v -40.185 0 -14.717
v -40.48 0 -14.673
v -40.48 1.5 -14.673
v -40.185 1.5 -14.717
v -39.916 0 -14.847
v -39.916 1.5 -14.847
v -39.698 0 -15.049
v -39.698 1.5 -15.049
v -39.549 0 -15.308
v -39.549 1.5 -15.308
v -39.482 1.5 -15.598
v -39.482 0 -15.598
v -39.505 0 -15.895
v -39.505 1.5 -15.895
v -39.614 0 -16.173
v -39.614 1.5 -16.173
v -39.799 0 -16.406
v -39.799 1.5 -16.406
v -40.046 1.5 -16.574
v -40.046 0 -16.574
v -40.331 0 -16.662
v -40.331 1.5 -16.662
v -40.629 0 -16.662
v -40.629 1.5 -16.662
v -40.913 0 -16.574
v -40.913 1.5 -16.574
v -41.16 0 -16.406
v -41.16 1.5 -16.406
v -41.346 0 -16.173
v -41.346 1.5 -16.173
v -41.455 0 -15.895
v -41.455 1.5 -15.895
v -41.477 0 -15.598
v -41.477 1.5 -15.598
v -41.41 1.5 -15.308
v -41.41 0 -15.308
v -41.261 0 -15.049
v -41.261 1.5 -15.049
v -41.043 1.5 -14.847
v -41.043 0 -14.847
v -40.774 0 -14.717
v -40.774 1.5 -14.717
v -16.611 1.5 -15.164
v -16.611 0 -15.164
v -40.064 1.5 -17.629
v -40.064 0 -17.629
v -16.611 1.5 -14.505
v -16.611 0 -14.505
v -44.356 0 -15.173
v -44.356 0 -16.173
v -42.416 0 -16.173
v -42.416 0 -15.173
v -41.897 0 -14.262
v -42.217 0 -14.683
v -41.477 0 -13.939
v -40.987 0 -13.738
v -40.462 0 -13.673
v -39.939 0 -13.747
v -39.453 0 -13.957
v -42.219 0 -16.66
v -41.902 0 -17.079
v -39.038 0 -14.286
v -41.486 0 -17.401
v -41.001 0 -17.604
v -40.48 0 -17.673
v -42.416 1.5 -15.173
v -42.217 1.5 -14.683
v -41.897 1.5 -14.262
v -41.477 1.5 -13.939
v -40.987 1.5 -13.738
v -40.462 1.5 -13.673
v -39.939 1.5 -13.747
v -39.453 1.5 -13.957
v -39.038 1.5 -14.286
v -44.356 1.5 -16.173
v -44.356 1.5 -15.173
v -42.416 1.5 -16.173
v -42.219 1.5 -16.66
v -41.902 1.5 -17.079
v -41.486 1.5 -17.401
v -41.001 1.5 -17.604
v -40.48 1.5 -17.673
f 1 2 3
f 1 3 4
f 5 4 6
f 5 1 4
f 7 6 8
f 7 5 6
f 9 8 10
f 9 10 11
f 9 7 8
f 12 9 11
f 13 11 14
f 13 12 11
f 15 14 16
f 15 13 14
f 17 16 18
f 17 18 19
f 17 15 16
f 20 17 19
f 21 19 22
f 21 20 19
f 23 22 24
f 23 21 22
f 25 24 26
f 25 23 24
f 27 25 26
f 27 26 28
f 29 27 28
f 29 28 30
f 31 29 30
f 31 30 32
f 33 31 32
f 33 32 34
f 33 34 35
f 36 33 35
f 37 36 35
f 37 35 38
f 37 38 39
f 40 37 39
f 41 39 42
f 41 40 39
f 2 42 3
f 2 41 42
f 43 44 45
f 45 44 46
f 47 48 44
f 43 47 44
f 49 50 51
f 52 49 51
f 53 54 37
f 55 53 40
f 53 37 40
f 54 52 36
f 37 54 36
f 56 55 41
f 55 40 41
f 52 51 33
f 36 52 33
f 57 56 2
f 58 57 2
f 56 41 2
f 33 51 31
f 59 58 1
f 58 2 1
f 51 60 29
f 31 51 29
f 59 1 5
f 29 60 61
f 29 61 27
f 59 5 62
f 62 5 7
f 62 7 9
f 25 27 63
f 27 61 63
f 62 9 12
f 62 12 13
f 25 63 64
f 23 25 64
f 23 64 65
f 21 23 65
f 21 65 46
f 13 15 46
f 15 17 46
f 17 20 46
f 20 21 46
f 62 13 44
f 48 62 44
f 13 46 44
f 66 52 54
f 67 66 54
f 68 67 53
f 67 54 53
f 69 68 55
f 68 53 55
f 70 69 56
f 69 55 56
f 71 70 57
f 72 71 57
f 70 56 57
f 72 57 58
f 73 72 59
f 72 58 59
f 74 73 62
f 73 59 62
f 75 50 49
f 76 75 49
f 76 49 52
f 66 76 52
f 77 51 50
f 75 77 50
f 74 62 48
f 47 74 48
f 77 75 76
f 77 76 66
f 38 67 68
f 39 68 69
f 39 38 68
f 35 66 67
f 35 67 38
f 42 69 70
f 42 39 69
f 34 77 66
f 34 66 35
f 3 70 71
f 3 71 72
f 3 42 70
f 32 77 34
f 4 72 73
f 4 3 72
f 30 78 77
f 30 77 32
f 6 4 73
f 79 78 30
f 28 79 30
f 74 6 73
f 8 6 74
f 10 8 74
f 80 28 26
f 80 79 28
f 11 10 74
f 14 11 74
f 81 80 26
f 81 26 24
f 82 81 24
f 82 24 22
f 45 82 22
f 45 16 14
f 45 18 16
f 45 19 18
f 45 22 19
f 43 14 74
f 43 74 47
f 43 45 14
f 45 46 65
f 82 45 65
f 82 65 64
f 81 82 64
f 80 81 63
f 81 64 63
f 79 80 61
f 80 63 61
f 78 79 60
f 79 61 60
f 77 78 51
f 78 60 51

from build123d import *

# Parameters (mm, degrees)
SKETCH1_R           = 1
BOSS_EXTRUDE1_DEPTH = 1.5


with BuildPart() as part:
    # Sketch1 → Boss-Extrude1 (new body)
    # profile 1 of 3: a face of its own
    with BuildSketch(Plane(origin=(0, 0, 0), x_dir=(1, 0, 0), z_dir=(0, 1, 0))):
        with BuildLine():
            ThreePointArc((-38.479582276, 15.672906391), (-38.624558781, 14.925318383), (-39.038470107, 14.28611307))
            Line((-39.038470107, 14.28611307), (-16.611056788, 14.505213721))
            Line((-16.611056788, 14.505213721), (-16.611056788, 15.164223273))
            Line((-16.611056788, 15.164223273), (-40.063758895, 17.629201593))
            ThreePointArc((-40.063758895, 17.629201593), (-38.925290354, 16.931547173), (-38.479582276, 15.672906391))
        make_face()
    # profile 2 of 3: a face of its own
    with BuildSketch(Plane(origin=(0, 0, 0), x_dir=(1, 0, 0), z_dir=(0, 1, 0))):
        with BuildLine():
            ThreePointArc((-40.479582276, 17.672906391), (-41.704327148, 17.254045221), (-42.41607395, 16.172906391))
            ThreePointArc((-42.41607395, 16.172906391), (-42.479582276, 15.672906391), (-42.41607395, 15.172906391))
            ThreePointArc((-42.41607395, 15.172906391), (-40.987470858, 13.738468698), (-39.038470107, 14.28611307))
            ThreePointArc((-39.038470107, 14.28611307), (-38.624558781, 14.925318383), (-38.479582276, 15.672906391))
            ThreePointArc((-38.479582276, 15.672906391), (-38.925290354, 16.931547173), (-40.063758895, 17.629201593))
            Line((-40.063758895, 17.629201593), (-40.479582276, 17.672906391))
        make_face()
        with Locations(Location((-40.479582276, 15.672906391, 0), (0, 0, 270))):
            Circle(SKETCH1_R, mode=Mode.SUBTRACT)
    # profile 3 of 3: a face of its own
    with BuildSketch(Plane(origin=(0, 0, 0), x_dir=(1, 0, 0), z_dir=(0, 1, 0))):
        with BuildLine():
            Line((-42.41607395, 16.172906391), (-44.35607395, 16.172906391))
            Line((-44.35607395, 16.172906391), (-44.35607395, 15.172906391))
            Line((-44.35607395, 15.172906391), (-42.41607395, 15.172906391))
            ThreePointArc((-42.41607395, 15.172906391), (-42.479582276, 15.672906391), (-42.41607395, 16.172906391))
        make_face()
    extrude(amount=BOSS_EXTRUDE1_DEPTH)


solid = part.part
